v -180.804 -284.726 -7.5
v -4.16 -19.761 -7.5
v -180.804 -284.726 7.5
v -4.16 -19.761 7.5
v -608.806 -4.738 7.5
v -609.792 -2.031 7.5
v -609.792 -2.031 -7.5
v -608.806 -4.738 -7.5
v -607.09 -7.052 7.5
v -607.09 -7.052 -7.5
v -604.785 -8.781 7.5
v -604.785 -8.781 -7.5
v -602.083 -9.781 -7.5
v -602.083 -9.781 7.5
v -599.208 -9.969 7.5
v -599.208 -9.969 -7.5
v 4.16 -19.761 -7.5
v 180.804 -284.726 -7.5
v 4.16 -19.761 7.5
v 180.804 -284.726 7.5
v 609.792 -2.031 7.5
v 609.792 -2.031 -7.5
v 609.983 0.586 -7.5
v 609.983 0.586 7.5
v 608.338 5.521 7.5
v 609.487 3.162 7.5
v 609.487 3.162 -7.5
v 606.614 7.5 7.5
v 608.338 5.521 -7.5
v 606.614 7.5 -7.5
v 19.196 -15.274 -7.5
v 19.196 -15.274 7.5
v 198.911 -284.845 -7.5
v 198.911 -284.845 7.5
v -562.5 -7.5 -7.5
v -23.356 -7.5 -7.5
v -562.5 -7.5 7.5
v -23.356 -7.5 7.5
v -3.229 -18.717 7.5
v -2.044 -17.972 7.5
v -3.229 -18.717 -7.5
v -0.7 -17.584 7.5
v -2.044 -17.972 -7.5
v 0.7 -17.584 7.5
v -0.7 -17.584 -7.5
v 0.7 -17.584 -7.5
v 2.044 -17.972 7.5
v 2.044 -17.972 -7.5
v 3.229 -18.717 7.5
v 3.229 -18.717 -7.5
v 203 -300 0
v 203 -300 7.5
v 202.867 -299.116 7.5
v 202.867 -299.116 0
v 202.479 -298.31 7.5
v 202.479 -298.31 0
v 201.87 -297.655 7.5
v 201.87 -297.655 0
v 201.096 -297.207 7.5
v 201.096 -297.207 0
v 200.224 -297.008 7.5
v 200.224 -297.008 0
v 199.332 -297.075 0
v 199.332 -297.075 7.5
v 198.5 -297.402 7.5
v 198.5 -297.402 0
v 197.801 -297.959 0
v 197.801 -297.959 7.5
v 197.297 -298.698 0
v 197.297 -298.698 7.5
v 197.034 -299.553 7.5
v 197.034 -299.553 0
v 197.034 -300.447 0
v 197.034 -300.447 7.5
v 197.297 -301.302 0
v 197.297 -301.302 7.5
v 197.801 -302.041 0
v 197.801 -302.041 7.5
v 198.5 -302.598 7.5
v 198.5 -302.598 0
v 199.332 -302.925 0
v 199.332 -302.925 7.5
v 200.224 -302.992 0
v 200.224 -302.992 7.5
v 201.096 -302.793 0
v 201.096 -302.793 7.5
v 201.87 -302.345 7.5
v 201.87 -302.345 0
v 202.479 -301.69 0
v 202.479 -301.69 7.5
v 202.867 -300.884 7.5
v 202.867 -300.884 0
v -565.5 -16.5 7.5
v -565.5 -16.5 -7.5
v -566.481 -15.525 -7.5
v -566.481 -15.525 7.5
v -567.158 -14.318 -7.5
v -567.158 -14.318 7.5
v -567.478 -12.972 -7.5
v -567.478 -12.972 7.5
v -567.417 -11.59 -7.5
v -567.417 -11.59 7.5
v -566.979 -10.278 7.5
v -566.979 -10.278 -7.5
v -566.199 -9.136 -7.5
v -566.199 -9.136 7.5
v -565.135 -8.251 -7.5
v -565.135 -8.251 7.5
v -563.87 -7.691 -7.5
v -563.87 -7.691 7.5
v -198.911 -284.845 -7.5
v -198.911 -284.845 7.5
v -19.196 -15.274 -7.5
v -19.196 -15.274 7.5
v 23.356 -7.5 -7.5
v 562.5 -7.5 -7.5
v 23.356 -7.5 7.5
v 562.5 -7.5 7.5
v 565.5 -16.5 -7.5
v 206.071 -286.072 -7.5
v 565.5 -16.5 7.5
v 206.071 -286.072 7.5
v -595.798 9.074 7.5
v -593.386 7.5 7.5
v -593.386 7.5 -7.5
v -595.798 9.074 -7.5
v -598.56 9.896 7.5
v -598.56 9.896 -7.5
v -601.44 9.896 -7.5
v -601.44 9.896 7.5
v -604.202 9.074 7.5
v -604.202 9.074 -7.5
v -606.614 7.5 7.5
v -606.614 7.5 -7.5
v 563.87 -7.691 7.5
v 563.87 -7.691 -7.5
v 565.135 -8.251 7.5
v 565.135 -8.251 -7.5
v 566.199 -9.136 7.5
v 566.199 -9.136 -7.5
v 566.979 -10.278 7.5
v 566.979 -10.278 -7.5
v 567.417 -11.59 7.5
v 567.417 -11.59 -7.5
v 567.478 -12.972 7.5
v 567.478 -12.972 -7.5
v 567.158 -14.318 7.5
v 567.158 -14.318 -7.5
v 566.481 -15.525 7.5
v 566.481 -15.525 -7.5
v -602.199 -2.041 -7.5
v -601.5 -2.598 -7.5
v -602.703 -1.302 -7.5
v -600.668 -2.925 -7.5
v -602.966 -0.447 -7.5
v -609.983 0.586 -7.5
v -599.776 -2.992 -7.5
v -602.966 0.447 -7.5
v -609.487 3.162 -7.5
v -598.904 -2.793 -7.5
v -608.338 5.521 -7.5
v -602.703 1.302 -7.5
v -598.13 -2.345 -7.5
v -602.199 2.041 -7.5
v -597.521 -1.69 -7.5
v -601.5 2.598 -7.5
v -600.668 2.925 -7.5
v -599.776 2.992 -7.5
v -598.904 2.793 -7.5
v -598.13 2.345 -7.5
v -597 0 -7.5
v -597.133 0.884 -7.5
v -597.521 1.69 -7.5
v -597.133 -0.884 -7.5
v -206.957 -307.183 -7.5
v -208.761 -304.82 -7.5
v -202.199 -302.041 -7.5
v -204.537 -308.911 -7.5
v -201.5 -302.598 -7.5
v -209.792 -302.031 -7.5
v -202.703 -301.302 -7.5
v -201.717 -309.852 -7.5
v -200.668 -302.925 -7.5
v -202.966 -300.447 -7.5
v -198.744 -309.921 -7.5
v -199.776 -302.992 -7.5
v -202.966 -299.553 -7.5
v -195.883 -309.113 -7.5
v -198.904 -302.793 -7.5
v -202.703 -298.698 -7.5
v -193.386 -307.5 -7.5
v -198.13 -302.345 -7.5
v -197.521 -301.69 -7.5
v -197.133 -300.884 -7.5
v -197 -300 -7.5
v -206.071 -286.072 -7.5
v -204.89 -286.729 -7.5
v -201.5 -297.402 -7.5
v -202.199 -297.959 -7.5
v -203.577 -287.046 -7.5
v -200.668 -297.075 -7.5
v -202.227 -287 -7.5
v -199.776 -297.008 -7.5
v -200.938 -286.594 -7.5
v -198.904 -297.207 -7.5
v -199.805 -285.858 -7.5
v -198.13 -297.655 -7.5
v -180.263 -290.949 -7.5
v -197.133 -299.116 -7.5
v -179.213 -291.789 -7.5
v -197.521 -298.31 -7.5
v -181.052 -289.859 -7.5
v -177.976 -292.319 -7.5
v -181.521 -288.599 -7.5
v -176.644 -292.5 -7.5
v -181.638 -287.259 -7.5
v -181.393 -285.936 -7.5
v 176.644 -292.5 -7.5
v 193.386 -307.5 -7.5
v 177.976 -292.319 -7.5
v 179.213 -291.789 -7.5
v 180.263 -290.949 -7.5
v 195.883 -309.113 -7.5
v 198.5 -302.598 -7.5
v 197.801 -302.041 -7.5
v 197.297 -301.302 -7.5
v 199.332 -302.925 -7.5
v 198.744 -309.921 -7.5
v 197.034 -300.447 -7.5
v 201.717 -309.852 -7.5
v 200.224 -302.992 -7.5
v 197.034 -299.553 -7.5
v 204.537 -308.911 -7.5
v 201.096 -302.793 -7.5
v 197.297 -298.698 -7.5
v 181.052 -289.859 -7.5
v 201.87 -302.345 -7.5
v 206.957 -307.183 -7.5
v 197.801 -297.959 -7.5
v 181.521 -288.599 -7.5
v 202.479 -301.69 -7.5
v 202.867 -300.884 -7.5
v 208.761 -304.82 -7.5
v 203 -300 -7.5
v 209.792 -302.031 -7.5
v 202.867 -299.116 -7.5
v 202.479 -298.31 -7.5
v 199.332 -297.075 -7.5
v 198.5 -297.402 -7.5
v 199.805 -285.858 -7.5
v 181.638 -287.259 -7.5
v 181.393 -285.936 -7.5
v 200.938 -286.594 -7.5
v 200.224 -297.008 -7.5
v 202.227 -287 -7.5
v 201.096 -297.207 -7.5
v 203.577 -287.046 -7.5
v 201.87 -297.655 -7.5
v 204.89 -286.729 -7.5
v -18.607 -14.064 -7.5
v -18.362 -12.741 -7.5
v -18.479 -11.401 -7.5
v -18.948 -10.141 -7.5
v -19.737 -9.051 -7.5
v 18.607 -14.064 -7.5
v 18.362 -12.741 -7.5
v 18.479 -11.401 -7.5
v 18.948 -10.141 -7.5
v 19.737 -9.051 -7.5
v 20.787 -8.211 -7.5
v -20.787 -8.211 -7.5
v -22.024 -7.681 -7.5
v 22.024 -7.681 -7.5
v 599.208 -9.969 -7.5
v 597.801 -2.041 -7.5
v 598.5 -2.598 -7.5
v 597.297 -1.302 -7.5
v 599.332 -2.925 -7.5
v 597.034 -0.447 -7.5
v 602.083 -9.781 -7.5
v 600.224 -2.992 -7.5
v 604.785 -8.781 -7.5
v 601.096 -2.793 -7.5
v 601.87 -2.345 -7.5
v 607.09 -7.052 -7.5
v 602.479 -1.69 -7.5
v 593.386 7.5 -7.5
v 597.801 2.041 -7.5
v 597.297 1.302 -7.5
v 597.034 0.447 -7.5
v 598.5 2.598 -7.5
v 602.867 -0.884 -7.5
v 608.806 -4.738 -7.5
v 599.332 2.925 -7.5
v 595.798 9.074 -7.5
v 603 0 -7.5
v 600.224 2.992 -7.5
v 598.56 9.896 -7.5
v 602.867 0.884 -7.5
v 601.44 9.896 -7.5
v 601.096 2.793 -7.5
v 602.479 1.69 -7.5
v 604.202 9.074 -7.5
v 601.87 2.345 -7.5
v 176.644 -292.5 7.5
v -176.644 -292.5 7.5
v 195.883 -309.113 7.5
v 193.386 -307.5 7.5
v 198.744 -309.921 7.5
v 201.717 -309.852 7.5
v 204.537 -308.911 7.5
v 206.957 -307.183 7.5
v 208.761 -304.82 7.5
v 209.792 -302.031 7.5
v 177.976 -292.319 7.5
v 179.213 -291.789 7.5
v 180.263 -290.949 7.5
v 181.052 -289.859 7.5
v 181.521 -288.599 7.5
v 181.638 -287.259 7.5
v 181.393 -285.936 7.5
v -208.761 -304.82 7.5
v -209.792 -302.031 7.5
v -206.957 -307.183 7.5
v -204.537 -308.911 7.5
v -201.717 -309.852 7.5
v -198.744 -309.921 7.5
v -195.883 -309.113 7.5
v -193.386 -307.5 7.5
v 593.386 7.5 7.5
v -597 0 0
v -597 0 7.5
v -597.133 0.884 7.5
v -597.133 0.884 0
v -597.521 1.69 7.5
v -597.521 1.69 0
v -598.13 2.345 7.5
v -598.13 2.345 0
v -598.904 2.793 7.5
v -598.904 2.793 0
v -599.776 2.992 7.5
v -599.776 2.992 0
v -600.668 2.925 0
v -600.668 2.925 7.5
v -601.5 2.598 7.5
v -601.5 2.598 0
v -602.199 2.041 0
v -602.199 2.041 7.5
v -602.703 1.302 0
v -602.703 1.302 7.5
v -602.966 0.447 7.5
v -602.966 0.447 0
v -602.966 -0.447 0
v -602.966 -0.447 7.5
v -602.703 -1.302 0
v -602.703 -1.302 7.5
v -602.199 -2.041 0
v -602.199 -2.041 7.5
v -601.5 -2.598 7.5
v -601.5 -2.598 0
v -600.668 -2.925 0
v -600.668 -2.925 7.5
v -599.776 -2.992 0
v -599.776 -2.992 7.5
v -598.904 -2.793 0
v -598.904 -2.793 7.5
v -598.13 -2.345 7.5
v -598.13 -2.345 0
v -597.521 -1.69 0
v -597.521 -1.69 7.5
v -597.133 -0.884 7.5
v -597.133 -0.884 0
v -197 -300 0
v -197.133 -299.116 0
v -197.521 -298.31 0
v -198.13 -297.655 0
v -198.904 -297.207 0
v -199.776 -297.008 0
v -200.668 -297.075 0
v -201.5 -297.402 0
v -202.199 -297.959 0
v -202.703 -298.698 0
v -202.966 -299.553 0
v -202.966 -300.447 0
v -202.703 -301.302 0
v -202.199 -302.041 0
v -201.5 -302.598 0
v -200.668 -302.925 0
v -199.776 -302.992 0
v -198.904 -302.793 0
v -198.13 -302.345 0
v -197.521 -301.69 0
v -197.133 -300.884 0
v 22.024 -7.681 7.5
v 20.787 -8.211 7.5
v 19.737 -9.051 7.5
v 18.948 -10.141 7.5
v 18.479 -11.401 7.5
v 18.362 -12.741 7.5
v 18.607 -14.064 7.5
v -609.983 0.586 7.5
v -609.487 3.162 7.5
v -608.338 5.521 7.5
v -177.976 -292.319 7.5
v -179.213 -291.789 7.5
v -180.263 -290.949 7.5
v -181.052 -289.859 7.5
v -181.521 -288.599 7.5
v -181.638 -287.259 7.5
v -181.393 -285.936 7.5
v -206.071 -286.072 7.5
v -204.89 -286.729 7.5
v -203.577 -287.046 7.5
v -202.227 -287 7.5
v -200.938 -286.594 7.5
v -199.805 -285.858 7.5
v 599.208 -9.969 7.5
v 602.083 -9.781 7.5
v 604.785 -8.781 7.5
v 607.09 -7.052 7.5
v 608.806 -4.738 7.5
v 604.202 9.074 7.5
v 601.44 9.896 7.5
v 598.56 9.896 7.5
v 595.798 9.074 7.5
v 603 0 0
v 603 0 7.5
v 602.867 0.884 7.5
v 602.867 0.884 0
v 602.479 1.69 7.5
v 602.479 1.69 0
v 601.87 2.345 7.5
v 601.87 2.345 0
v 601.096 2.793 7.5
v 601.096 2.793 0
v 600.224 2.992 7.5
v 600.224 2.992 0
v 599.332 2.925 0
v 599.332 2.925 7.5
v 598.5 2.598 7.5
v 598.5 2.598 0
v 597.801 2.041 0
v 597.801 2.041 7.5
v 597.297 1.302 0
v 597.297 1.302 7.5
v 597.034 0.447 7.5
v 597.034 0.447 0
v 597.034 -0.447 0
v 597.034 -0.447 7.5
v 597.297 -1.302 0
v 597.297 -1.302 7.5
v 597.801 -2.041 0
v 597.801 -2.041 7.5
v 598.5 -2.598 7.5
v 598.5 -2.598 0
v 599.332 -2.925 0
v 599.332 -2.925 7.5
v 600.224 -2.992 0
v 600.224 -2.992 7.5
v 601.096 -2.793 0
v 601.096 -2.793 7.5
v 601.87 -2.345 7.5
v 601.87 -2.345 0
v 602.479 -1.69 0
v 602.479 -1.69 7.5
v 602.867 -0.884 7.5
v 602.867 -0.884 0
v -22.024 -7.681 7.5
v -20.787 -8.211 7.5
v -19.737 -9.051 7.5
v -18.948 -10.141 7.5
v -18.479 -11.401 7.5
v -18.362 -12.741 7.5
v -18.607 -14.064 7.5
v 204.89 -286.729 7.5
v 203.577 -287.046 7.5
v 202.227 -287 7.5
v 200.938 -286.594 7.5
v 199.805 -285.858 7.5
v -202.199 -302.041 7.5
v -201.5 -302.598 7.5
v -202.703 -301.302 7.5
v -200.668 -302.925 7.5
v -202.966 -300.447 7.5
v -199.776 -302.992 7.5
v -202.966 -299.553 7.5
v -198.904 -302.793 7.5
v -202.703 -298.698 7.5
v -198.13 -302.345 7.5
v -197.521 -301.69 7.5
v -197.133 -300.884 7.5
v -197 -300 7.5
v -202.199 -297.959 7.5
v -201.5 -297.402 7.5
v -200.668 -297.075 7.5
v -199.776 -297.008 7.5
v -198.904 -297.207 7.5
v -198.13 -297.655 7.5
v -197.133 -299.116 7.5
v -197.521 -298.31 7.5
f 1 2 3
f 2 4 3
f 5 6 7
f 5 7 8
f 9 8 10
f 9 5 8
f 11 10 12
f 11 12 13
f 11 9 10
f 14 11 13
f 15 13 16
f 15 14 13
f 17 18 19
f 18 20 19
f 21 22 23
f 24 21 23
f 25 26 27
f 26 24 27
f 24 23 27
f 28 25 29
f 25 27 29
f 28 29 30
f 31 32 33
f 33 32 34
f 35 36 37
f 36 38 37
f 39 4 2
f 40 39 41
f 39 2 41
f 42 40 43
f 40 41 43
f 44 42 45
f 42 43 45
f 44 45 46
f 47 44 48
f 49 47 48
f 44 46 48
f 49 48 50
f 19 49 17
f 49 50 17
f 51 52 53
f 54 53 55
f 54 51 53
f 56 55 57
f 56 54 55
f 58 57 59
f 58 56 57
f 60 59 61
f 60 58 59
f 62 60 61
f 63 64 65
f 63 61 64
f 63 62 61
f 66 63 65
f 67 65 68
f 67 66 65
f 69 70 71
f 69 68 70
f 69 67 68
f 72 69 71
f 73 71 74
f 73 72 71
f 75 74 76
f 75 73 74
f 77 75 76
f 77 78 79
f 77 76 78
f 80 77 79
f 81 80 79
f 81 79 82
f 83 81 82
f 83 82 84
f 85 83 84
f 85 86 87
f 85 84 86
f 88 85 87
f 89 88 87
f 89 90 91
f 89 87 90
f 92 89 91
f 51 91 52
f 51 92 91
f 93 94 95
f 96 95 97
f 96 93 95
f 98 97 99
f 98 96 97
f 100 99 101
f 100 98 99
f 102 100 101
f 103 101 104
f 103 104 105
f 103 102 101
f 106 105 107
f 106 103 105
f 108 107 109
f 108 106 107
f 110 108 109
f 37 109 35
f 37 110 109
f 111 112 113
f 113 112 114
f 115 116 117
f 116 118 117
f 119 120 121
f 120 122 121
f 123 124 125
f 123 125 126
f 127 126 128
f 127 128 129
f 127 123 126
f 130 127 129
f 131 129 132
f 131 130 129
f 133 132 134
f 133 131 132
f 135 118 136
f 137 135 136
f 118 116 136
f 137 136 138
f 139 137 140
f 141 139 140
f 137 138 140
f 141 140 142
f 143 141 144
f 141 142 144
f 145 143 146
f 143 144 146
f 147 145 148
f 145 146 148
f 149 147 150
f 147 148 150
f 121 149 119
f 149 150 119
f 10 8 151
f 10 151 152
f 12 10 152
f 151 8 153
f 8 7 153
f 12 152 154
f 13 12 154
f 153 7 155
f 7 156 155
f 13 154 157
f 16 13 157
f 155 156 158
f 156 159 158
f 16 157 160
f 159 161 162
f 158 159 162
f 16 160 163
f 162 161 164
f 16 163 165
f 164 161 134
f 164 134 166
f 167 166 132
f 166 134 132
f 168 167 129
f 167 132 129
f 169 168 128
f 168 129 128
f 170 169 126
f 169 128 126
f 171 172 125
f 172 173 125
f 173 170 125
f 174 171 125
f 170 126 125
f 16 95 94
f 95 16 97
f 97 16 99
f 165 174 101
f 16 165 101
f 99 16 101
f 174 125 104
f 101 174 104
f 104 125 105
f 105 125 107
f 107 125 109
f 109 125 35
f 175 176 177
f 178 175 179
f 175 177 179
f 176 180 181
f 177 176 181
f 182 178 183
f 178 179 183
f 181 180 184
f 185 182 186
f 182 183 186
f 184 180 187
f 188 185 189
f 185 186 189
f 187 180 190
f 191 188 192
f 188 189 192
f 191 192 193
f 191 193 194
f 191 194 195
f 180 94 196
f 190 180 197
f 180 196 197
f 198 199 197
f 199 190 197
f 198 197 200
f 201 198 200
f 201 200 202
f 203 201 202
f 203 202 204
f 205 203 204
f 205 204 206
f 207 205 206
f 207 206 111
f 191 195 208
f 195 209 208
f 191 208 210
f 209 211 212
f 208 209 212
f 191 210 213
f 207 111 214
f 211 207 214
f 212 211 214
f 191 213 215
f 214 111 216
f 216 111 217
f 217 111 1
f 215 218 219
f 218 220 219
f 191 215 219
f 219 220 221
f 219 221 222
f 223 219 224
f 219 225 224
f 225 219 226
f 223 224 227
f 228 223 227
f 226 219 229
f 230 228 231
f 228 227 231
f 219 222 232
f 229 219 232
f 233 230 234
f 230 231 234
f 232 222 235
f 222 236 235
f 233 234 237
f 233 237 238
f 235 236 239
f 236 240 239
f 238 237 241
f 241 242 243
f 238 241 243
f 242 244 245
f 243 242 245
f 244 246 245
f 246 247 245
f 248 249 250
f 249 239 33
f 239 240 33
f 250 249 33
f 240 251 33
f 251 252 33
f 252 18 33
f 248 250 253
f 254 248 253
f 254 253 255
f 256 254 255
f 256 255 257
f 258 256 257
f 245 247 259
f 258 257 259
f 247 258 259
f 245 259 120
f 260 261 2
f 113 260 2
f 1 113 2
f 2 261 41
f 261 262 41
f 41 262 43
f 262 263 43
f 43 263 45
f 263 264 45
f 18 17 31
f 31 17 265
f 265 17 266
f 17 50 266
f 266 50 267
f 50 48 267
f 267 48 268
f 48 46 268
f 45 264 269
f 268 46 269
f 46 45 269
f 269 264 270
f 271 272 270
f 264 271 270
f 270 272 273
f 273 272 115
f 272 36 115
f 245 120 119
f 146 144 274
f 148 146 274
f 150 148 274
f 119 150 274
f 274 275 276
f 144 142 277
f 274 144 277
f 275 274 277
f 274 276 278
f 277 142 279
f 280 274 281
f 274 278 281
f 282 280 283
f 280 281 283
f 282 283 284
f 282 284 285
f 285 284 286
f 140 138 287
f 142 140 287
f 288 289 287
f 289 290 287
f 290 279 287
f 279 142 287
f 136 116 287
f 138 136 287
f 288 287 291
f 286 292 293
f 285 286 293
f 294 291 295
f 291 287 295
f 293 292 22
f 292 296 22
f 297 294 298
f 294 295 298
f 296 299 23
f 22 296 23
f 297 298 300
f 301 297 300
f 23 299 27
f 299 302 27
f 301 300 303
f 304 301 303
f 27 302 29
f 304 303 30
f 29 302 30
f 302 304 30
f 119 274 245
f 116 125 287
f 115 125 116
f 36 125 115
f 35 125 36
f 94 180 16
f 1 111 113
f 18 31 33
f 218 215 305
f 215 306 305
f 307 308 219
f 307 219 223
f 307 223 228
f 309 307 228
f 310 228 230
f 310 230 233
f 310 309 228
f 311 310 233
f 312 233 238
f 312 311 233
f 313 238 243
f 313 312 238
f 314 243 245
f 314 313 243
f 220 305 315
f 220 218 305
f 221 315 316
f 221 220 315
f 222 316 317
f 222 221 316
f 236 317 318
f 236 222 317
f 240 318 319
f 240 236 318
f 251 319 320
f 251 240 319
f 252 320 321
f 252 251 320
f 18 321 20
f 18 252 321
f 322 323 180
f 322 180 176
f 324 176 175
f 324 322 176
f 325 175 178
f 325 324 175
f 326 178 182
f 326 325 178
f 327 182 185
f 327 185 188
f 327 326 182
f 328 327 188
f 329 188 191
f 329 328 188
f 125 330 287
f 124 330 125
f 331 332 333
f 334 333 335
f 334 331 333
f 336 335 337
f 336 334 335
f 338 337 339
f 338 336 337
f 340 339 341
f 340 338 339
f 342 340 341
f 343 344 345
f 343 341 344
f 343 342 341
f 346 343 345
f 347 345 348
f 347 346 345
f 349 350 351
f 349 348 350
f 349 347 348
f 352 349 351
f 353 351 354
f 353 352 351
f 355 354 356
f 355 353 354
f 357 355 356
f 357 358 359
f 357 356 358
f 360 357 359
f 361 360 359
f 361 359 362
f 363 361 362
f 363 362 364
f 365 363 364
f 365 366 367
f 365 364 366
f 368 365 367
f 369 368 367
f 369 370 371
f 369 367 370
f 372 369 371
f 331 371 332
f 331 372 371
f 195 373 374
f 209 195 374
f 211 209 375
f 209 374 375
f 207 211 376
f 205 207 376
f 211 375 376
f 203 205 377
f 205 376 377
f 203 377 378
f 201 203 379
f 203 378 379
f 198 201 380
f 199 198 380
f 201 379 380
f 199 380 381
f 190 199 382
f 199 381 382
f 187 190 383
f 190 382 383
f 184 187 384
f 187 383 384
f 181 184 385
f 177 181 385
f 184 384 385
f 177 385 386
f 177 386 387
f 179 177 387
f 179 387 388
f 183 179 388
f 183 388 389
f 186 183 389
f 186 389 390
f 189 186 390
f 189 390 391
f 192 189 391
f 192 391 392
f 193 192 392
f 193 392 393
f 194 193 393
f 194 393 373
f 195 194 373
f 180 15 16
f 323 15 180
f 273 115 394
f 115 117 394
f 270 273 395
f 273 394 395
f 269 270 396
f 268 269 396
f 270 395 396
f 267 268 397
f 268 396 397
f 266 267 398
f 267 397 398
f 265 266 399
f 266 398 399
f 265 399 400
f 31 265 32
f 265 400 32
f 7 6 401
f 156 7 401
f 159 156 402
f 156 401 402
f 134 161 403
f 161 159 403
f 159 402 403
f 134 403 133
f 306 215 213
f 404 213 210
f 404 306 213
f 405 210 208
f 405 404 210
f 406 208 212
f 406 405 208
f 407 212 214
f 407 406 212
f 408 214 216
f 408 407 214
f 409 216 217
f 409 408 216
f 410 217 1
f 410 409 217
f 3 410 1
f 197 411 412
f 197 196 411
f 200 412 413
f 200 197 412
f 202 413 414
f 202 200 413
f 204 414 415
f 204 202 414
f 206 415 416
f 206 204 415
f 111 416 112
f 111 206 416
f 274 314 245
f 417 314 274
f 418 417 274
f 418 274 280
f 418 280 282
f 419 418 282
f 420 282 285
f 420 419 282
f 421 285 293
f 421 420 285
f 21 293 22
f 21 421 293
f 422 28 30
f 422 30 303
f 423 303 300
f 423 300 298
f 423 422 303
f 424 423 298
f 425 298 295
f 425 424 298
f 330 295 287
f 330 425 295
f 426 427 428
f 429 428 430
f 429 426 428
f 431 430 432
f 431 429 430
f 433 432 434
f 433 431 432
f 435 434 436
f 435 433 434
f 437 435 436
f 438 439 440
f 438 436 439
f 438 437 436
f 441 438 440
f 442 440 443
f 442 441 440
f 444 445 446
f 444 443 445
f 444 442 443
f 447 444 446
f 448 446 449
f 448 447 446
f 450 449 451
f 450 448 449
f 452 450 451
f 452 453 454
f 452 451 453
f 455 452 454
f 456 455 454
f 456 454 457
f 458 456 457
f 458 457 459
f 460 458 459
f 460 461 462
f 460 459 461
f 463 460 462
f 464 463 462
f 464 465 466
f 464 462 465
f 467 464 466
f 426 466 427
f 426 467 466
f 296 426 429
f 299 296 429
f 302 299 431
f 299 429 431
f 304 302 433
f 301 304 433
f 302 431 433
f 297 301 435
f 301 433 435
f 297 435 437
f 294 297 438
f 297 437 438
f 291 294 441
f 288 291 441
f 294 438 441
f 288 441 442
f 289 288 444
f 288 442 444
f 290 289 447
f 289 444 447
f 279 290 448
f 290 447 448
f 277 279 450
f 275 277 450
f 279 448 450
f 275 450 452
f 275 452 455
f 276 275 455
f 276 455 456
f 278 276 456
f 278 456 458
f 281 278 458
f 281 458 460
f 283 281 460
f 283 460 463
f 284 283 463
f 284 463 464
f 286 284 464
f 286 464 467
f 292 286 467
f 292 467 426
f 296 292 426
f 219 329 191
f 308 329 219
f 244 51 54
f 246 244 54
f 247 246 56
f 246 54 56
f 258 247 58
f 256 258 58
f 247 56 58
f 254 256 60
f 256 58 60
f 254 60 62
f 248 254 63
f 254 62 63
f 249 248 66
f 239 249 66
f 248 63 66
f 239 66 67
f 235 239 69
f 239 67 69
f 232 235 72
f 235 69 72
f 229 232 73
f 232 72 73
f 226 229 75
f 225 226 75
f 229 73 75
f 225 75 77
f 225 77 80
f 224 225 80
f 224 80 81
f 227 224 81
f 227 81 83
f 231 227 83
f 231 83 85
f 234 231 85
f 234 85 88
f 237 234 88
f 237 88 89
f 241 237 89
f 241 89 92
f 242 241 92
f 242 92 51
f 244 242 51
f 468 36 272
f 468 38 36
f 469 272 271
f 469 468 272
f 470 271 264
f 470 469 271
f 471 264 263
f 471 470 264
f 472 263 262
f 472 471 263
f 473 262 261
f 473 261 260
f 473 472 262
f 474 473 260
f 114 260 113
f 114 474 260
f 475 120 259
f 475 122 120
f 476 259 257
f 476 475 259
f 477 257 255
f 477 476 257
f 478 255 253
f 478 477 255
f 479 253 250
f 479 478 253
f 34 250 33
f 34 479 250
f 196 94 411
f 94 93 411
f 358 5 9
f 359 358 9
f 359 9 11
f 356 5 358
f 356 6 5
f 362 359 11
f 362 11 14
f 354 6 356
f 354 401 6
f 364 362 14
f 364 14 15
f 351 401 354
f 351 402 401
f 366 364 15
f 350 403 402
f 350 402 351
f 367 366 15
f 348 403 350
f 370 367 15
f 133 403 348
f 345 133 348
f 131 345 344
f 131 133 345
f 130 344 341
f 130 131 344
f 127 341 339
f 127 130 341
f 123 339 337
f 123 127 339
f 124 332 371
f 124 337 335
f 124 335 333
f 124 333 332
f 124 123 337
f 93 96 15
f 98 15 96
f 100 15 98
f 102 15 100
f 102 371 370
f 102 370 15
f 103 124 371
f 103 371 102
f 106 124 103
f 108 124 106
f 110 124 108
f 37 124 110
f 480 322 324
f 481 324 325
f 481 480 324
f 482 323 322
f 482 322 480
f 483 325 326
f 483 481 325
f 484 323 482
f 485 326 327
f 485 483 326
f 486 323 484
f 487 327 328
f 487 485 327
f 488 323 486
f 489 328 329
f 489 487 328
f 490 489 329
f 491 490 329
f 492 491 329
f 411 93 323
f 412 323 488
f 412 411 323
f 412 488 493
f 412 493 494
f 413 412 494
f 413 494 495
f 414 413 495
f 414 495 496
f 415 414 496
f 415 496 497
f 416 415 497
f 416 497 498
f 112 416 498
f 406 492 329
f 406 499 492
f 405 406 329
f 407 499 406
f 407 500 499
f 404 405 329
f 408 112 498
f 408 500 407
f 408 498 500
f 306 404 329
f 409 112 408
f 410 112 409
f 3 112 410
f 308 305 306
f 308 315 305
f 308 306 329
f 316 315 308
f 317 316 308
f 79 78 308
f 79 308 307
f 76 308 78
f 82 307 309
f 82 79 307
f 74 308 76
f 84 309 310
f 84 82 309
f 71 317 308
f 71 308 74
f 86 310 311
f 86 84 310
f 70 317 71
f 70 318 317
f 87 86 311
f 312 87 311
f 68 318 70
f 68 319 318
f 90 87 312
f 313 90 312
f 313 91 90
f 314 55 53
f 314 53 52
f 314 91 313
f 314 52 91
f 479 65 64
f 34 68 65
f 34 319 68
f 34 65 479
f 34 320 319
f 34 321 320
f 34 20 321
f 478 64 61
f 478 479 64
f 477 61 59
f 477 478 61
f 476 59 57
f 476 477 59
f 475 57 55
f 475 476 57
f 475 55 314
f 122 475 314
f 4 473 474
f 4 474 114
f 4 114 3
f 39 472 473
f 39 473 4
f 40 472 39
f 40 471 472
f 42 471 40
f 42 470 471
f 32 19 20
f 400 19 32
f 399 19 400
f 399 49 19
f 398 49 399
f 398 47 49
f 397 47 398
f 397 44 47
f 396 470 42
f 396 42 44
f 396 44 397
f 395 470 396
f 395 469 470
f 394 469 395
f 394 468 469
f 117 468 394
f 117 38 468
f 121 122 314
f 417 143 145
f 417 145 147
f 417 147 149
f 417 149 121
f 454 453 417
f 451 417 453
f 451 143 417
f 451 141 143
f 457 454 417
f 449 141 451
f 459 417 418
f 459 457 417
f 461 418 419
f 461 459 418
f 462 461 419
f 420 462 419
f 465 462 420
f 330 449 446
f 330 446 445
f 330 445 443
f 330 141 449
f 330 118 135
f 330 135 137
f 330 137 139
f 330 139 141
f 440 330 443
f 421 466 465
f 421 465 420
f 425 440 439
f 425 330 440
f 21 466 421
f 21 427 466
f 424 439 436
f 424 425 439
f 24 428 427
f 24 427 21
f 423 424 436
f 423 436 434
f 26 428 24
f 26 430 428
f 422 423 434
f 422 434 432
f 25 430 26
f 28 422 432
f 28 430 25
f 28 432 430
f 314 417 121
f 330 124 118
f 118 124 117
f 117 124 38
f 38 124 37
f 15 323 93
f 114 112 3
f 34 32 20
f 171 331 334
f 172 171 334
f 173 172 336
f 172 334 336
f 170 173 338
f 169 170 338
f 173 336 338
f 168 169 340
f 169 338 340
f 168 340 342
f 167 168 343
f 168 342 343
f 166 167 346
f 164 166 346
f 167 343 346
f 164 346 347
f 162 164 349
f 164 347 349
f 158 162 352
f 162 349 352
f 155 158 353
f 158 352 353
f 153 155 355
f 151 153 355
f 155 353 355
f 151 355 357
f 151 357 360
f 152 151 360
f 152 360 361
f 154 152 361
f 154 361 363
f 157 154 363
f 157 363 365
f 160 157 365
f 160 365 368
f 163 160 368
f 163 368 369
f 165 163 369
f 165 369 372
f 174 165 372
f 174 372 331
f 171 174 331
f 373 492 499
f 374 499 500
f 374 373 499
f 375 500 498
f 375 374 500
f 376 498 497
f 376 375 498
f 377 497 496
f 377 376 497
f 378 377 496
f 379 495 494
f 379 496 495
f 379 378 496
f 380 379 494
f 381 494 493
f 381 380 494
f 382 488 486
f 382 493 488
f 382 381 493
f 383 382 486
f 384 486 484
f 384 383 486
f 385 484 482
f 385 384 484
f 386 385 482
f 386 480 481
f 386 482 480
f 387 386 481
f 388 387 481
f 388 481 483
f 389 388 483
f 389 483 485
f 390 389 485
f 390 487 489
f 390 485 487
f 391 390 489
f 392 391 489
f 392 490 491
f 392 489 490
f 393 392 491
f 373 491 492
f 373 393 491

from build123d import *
from build123d.topology import SkipClean

# Parameters (mm, degrees)
SKETCH1_R             = 10
SKETCH1_R_2           = 3
BOSS_EXTRUDE1_DEPTH   = 7.5
BOSS_EXTRUDE1_2_DEPTH = 7.5
BOSS_EXTRUDE1_3_DEPTH = 7.5
BOSS_EXTRUDE1_4_DEPTH = 7.5
BOSS_EXTRUDE2_DEPTH   = 7.5
SKETCH3_R             = 3
CUT_EXTRUDE1_DEPTH    = 15
FILLET1_R             = 5


with BuildPart() as part:
    # Sketch1 → Boss-Extrude1 (new, symmetric)
    with BuildSketch(Plane.XY):
        with Locations((-600, 0)):
            Circle(SKETCH1_R)
        with Locations((-600, 0)):
            Circle(SKETCH1_R_2, mode=Mode.SUBTRACT)
    extrude(amount=BOSS_EXTRUDE1_DEPTH, both=True)



with BuildPart() as body_2:
    # Sketch1 → Boss-Extrude1 2 (new, symmetric)
    with BuildSketch(Plane.XY):
        with Locations((-200, -300)):
            Circle(SKETCH1_R)
        with Locations((-200, -300)):
            Circle(SKETCH1_R_2, mode=Mode.SUBTRACT)
    extrude(amount=BOSS_EXTRUDE1_2_DEPTH, both=True)


with BuildPart() as body_3:
    # Sketch1 → Boss-Extrude1 3 (new, symmetric)
    with BuildSketch(Plane.XY):
        with Locations((200, -300)):
            Circle(SKETCH1_R)
        with Locations((200, -300)):
            Circle(SKETCH1_R_2, mode=Mode.SUBTRACT)
    extrude(amount=BOSS_EXTRUDE1_3_DEPTH, both=True)


with BuildPart() as body_4:
    # Sketch1 → Boss-Extrude1 4 (new, symmetric)
    with BuildSketch(Plane.XY):
        with Locations((600, 0)):
            Circle(SKETCH1_R)
        with Locations((600, 0)):
            Circle(SKETCH1_R_2, mode=Mode.SUBTRACT)
    extrude(amount=BOSS_EXTRUDE1_4_DEPTH, both=True)


with BuildPart() as part_1:
    add(part.part)

    add(body_2.part)  # Boss-Extrude2 merges body 2

    add(body_3.part)  # Boss-Extrude2 merges body 3

    add(body_4.part)  # Boss-Extrude2 merges body 4
    # Sketch2 → Boss-Extrude2 (add, symmetric)
    with BuildSketch(Plane.XY):
        Polygon((200, -307.5), (202.5, -307.5), (204.5, -306), (622.5, 7.5), (-622.5, 7.5), (-204.5, -306), (-202.5, -307.5), (-200, -307.5), align=None)
        Polygon((201.842585459, -289.243060906), (577.5, -7.5), (14.013878189, -7.5), align=None, mode=Mode.SUBTRACT)
        Polygon((-577.5, -7.5), (-201.842585459, -289.243060906), (-14.013878189, -7.5), align=None, mode=Mode.SUBTRACT)
        Polygon((-185.986121811, -292.5), (185.986121811, -292.5), (0, -13.520817283), align=None, mode=Mode.SUBTRACT)
    extrude(amount=BOSS_EXTRUDE2_DEPTH, both=True)

    # Sketch3 → Cut-Extrude1 (cut, symmetric)
    with SkipClean():  # the faces are left unmerged after this step: merging them gives an invalid solid
        with BuildSketch(Plane.XY):
            with Locations((-600, 0)):
                Circle(SKETCH3_R)
            with Locations((-200, -300)):
                Circle(SKETCH3_R)
            with Locations((200, -300)):
                Circle(SKETCH3_R)
            with Locations((600, 0)):
                Circle(SKETCH3_R)
            with BuildLine():
                Line((605.772412725, 8.165736423), (623.676739049, 10.899071484))
                Line((623.676739049, 10.899071484), (625.286418453, -4.2155453))
                Line((625.286418453, -4.2155453), (609.468772967, -3.215950638))
                ThreePointArc((609.468772967, -3.215950638), (609.511000758, 3.088829), (605.772412725, 8.165736423))
            make_face()
            with BuildLine():
                Line((-625.286418453, -4.2155453), (-609.468772967, -3.215950638))
                ThreePointArc((-609.468772967, -3.215950638), (-609.511000758, 3.088829), (-605.772412725, 8.165736423))
                Line((-605.772412725, 8.165736423), (-623.676739049, 10.899071484))
                Line((-623.676739049, 10.899071484), (-625.286418453, -4.2155453))
            make_face()
        extrude(amount=CUT_EXTRUDE1_DEPTH, both=True, mode=Mode.SUBTRACT)

    # Fillet1
    fillet1_edges = [part_1.edges().sort_by_distance(p)[0] for p in [
        (0, -13.520817283, 0),
        (-185.986121811, -292.5, 0),
        (185.986121811, -292.5, 0),
        (14.013878189, -7.5, 0),
        (201.842585459, -289.243060906, 0),
        (577.5, -7.5, 0),
        (-577.5, -7.5, 0),
        (-201.842585459, -289.243060906, 0),
        (-14.013878189, -7.5, 0),
    ]]
    fillet(fillet1_edges, radius=FILLET1_R)


solid = part_1.part
